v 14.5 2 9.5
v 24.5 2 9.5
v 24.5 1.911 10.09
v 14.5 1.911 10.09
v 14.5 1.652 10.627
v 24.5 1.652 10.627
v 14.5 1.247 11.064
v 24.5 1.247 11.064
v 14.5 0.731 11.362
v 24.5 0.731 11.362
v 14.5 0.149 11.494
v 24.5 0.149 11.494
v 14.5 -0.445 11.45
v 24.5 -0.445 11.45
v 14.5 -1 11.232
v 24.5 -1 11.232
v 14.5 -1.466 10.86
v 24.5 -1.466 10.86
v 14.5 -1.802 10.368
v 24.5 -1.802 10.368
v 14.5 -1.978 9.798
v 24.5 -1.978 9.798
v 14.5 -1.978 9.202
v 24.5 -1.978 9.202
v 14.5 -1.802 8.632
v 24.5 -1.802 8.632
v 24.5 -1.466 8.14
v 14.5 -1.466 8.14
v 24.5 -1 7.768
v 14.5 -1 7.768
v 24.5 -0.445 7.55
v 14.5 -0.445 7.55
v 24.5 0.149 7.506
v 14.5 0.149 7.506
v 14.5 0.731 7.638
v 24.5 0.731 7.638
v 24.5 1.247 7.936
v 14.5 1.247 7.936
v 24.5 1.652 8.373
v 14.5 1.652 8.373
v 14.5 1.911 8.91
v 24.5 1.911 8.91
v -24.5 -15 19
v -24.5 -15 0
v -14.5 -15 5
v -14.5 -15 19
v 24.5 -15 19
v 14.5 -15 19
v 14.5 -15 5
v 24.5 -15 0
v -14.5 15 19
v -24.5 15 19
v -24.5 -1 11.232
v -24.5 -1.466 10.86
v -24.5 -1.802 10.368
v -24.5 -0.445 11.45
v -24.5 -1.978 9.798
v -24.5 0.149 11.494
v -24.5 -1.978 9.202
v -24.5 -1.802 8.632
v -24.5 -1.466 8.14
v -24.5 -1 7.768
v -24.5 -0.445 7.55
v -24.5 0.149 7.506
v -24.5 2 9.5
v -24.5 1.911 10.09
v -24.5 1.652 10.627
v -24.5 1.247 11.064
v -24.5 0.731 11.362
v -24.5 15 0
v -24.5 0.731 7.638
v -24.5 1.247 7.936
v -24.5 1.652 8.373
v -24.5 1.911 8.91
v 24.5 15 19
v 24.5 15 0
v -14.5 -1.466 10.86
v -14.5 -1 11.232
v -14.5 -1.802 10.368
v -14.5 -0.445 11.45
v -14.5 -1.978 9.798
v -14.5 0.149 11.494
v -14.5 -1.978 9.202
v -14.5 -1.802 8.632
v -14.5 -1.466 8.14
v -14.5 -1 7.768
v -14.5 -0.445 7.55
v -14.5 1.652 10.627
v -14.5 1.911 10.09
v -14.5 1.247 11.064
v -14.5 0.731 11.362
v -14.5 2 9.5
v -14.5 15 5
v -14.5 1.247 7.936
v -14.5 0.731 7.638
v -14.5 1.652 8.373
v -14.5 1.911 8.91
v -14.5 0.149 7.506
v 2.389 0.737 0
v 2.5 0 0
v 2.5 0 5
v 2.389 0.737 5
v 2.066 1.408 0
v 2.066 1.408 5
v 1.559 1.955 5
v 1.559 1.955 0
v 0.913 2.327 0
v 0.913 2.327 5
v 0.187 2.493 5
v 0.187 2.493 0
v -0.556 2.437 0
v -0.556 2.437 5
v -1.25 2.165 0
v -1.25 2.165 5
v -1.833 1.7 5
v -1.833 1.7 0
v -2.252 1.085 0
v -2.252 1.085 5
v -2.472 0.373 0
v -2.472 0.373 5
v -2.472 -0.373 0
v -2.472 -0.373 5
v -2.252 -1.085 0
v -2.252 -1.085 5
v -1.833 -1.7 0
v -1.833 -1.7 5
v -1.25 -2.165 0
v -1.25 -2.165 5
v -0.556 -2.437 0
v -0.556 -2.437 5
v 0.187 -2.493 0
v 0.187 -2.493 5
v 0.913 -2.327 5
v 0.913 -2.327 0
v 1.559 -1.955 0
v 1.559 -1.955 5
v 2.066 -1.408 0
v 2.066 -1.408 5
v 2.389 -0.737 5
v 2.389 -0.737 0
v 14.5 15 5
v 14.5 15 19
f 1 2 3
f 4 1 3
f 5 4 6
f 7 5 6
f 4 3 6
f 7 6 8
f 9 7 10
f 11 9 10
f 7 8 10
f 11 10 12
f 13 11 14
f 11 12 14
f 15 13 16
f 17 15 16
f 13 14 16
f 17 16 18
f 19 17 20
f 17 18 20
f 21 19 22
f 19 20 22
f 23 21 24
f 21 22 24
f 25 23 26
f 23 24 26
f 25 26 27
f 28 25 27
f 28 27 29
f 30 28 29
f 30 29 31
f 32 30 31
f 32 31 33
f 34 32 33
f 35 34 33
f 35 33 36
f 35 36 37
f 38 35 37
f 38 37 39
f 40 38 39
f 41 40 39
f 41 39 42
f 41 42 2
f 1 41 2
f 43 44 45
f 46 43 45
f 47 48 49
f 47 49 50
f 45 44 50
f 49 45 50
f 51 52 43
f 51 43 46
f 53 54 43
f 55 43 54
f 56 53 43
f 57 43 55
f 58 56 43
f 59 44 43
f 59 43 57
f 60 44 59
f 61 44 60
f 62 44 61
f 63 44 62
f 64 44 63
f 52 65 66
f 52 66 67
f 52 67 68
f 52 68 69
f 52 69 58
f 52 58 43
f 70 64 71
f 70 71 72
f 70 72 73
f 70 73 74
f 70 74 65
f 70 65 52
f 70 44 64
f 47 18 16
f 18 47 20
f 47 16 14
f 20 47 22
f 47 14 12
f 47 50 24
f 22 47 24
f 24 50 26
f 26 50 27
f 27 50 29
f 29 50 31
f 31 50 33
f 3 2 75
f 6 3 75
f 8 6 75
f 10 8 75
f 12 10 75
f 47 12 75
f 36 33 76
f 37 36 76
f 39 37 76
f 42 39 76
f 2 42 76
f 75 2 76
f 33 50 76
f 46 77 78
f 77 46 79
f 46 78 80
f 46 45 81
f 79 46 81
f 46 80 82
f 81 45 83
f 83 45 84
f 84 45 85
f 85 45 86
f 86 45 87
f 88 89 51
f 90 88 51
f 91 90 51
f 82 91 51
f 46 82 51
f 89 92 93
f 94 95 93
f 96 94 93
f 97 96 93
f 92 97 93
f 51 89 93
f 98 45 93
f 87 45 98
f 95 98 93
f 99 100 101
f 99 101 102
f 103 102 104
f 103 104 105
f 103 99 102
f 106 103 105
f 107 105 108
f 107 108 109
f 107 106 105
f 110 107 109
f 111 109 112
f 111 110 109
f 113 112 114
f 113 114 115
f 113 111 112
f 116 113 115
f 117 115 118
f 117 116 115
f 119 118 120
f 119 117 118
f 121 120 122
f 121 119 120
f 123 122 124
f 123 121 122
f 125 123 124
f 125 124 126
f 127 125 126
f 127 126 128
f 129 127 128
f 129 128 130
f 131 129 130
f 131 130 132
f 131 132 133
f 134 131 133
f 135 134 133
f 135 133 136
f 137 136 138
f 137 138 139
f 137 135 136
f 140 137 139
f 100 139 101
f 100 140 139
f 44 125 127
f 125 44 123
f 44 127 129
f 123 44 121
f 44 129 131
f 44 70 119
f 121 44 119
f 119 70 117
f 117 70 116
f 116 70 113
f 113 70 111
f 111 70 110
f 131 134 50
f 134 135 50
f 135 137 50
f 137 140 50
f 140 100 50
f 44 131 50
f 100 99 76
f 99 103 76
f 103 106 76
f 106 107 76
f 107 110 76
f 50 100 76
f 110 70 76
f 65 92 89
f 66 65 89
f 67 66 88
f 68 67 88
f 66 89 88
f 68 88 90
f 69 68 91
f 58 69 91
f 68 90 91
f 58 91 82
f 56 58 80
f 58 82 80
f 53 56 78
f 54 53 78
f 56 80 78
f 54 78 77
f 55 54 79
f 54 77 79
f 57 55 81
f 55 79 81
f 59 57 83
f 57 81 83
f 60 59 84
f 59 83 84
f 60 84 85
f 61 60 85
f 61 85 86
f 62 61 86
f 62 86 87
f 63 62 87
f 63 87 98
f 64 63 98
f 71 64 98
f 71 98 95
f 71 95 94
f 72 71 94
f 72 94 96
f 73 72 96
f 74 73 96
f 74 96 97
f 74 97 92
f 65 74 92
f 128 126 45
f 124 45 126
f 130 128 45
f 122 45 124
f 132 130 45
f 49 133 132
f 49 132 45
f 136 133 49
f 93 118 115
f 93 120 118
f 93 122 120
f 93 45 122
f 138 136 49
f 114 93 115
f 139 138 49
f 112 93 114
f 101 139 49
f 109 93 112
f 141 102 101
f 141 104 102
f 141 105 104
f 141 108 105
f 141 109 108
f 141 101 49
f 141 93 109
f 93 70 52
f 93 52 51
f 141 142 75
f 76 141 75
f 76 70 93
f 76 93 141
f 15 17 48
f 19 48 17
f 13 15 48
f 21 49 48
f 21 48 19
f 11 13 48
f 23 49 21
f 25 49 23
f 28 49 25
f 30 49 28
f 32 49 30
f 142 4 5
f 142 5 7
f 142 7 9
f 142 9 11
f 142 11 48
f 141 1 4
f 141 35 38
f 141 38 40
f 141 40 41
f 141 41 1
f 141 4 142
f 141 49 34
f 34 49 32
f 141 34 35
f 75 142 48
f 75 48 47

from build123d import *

# Parameters (mm, degrees)
F0_W     = 29
F0_H     = 30
F0_R     = 2.5
F1_DEPTH = 5
F0_W_2   = 10
F2_DEPTH = 19
F3_DEPTH = 19
F4_R     = 2
F5_DEPTH = 49.001


with BuildPart() as f1:
    # F0 (on Top) → F1 (new body)
    with BuildSketch(Plane.XY):
        Rectangle(F0_W, F0_H)
        Circle(F0_R, mode=Mode.SUBTRACT)
    extrude(amount=F1_DEPTH)

    # F0 (on Top) → F2 (join)
    with BuildSketch(Plane.XY):
        with Locations((-19.5, 0)):
            Rectangle(F0_W_2, F0_H)
    extrude(amount=F2_DEPTH)

    # F0 (on Top) → F3 (join)
    with BuildSketch(Plane.XY):
        with Locations((19.5, 0)):
            Rectangle(F0_W_2, F0_H)
    extrude(amount=F3_DEPTH)

    # F4 (on face) → F5 (cut, through all)
    with BuildSketch(Plane.YZ.offset(24.5)):
        with Locations((0, 9.5)):
            Circle(F4_R)
    extrude(amount=-F5_DEPTH, mode=Mode.SUBTRACT)


solid = f1.part
